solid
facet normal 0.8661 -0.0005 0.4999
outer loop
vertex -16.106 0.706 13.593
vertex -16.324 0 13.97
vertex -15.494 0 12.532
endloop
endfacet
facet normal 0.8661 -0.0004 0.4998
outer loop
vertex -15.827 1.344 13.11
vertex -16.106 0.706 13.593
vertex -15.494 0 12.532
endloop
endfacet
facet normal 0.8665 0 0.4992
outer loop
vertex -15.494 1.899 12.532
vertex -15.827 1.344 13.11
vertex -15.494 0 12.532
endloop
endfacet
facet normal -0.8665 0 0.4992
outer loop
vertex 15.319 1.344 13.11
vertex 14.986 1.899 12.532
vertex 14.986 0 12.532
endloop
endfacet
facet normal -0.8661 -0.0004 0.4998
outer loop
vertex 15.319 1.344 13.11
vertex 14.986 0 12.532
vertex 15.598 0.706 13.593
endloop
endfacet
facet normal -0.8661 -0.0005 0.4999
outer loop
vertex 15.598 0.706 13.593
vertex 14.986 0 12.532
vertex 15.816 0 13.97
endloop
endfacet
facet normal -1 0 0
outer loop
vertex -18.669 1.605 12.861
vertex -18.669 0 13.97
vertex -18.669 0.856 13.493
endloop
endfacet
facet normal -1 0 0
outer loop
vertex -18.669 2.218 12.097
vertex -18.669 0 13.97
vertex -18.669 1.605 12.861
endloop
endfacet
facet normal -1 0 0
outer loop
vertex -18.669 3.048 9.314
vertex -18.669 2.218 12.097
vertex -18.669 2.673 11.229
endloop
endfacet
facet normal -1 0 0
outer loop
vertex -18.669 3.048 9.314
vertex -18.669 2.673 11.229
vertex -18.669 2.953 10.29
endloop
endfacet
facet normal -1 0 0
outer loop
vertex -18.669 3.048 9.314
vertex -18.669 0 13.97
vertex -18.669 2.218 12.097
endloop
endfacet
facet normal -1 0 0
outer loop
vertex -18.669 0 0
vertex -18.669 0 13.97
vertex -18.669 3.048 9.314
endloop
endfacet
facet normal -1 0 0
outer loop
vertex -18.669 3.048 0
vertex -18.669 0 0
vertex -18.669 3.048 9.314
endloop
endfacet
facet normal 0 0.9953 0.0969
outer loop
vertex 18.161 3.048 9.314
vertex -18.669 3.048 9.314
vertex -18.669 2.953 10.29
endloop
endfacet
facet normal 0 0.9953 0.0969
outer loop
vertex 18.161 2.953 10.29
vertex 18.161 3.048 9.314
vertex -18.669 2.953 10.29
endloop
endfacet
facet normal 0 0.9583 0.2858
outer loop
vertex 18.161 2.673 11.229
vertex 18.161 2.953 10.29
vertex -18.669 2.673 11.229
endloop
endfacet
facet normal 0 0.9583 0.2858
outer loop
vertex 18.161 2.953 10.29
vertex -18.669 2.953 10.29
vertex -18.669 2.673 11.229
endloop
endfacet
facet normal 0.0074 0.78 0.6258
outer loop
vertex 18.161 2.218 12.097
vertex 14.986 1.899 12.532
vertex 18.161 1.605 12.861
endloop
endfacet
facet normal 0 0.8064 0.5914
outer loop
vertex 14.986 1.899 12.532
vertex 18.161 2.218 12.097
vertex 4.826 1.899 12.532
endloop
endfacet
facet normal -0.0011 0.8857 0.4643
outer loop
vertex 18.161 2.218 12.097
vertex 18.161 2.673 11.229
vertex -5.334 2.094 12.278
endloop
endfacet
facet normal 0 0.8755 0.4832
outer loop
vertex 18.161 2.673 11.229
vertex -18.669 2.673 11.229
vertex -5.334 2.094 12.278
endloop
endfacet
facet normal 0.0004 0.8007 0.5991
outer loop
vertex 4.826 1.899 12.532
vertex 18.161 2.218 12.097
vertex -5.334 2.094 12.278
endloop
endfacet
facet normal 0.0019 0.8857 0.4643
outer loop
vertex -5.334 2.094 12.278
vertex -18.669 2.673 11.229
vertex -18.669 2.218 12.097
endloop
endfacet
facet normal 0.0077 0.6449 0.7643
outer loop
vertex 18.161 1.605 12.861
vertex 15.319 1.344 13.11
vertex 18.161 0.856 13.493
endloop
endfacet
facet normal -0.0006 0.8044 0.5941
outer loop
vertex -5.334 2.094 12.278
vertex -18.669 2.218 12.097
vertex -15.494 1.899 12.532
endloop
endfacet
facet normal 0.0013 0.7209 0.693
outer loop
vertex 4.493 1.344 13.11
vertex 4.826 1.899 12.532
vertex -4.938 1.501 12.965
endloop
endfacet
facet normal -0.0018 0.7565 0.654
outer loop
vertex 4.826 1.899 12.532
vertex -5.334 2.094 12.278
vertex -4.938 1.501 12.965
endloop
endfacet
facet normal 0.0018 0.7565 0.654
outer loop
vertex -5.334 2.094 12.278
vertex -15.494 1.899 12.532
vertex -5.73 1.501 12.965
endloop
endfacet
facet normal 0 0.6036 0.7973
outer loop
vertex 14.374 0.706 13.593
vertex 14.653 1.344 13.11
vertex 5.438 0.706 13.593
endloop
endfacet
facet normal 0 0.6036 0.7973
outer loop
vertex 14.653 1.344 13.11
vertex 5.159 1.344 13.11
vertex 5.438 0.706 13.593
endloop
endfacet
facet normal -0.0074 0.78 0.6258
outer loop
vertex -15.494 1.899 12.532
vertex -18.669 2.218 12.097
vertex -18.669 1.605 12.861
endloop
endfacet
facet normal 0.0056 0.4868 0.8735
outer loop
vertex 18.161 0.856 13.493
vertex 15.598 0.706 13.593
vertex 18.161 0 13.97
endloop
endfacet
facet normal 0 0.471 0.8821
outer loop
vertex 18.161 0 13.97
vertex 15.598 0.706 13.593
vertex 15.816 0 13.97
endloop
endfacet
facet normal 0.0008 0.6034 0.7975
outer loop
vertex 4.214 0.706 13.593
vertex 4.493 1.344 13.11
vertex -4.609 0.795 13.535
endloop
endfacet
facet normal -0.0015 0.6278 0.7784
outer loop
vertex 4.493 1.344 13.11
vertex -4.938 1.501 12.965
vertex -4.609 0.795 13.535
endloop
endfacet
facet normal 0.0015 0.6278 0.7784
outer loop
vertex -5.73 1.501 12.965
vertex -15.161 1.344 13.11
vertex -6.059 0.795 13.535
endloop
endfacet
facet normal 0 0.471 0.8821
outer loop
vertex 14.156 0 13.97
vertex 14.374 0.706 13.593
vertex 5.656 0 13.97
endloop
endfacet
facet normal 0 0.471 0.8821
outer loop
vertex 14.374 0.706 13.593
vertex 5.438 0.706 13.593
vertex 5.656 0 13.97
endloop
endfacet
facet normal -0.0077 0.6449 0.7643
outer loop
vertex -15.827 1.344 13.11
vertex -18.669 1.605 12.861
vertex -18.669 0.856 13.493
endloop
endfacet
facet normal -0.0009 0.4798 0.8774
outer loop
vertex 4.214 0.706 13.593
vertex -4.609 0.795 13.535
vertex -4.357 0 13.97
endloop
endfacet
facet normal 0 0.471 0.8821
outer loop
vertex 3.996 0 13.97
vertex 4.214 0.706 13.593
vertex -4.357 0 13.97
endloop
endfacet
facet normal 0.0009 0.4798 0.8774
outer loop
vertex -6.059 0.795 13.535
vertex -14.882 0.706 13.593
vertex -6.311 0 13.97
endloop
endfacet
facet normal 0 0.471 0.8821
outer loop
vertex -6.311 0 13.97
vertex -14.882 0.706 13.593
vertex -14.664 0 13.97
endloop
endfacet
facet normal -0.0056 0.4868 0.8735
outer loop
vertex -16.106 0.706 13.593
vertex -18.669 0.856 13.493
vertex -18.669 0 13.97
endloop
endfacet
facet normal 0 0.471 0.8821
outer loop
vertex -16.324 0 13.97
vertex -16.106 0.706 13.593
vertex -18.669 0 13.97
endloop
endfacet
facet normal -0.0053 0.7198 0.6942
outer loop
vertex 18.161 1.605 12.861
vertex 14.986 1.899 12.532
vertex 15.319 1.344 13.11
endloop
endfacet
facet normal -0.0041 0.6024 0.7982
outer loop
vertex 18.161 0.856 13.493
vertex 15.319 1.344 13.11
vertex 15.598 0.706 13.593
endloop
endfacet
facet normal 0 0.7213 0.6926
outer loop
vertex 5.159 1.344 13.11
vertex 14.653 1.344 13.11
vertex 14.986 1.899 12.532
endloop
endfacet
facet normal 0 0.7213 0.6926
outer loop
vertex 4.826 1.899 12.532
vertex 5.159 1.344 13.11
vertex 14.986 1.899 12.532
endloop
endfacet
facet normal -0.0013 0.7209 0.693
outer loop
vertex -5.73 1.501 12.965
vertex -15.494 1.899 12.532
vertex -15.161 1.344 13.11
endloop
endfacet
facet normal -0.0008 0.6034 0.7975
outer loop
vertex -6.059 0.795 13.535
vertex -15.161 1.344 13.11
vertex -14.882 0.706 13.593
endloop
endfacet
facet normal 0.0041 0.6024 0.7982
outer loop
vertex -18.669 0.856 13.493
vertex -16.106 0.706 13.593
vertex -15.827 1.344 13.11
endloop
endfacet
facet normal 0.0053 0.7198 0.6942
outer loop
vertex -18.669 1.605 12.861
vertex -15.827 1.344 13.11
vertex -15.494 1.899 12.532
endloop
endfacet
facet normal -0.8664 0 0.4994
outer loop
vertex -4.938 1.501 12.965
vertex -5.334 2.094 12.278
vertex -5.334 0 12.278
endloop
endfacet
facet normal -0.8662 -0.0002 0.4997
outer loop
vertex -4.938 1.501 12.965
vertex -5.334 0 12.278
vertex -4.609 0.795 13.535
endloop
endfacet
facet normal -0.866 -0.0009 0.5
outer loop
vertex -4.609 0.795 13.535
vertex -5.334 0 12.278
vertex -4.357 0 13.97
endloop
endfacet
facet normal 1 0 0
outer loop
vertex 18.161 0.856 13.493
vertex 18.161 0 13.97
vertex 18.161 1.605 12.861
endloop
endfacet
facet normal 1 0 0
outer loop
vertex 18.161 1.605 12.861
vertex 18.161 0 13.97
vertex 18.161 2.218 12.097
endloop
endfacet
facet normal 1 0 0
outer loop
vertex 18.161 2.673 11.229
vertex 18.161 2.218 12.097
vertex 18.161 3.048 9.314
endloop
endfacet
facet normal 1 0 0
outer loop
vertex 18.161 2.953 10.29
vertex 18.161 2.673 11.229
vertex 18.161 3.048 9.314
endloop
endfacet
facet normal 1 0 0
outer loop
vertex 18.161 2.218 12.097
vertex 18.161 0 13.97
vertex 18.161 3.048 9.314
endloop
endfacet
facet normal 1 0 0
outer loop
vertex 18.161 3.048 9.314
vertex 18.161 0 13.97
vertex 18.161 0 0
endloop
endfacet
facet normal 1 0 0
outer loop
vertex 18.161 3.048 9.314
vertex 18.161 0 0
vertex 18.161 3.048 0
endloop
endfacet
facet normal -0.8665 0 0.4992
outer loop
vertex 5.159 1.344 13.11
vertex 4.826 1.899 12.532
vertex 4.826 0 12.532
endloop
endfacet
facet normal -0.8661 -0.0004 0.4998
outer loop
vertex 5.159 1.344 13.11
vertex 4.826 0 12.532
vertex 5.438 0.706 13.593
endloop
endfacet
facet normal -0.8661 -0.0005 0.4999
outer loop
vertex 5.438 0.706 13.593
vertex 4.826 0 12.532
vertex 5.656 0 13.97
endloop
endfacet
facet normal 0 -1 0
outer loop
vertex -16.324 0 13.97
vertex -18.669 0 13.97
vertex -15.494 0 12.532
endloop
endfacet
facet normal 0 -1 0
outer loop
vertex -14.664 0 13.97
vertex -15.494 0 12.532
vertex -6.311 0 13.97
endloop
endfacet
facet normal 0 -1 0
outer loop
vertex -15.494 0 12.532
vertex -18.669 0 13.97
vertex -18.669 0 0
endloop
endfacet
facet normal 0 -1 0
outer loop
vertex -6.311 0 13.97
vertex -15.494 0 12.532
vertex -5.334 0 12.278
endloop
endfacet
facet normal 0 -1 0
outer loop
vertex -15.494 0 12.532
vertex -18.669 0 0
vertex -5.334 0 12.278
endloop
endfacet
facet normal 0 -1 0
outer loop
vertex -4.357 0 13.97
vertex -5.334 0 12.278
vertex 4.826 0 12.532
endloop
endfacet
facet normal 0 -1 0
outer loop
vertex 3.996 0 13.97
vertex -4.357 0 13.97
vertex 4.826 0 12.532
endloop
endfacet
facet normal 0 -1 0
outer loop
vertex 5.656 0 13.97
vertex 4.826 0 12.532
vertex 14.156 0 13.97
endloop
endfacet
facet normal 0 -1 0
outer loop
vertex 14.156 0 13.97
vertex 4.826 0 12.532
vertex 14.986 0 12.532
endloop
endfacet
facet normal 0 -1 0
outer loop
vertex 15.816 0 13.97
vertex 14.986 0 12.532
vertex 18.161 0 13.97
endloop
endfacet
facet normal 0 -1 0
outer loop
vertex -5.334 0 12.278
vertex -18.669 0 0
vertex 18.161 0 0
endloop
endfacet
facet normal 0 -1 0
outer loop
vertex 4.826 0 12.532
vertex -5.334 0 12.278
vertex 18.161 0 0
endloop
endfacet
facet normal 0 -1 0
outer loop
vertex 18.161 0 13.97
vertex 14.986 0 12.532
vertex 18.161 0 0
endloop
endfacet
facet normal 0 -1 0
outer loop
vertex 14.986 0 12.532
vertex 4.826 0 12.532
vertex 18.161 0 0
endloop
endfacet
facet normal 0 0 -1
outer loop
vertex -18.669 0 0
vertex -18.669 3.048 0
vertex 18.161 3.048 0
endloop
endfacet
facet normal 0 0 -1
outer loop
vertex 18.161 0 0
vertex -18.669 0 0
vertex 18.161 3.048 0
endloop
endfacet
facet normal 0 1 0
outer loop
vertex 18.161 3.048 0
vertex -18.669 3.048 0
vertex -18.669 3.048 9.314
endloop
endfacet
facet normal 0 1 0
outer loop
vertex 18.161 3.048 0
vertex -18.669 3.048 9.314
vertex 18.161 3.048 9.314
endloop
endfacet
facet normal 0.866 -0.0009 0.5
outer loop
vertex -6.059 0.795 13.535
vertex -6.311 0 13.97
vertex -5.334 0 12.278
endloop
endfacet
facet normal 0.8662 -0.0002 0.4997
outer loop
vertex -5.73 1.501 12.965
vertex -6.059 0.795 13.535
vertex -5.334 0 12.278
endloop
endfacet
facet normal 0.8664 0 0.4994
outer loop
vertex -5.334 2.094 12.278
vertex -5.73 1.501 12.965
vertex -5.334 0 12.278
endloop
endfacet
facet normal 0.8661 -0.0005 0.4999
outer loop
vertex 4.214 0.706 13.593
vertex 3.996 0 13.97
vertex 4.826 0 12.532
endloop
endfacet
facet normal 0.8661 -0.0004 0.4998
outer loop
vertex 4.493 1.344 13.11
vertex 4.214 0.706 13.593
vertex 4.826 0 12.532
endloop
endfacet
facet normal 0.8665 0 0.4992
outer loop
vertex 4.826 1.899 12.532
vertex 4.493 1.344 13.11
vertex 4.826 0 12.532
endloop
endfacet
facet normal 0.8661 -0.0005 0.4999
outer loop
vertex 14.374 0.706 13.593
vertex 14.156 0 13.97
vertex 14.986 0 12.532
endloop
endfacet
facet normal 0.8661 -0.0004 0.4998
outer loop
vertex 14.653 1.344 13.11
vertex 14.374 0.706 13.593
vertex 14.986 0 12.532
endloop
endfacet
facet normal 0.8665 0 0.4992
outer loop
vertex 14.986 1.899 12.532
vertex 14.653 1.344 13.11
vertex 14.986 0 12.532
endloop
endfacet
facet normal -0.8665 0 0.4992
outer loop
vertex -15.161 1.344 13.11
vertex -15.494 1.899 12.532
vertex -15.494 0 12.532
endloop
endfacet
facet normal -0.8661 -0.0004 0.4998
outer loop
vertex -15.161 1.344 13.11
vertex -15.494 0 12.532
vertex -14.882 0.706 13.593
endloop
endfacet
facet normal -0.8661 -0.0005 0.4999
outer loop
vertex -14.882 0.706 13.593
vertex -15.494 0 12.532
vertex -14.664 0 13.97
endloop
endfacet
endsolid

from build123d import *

# Parameters (mm, degrees)
F0_W        = 36.83
F0_H        = 3.048
F1_DEPTH    = 13.97
F3_T1_DEPTH = 60.1094845304
F4_DEPTH    = 25.4


# Not quite as in the source:
# - a fillet or chamfer that OpenCascade refuses, or shapes differently, is made with other operations: its cross-section is extruded or revolved along the edge and cut away or added


with BuildPart() as f1:
    # F0 (on Top) → F1 (new body)
    with BuildSketch(Plane.XY):
        with Locations((-0.254, 1.524)):
            Rectangle(F0_W, F0_H)
    extrude(amount=F1_DEPTH)

    # F3: fillet of radius 5.08 on 1 edges, made by hand

    # F3_s2 → F3_t1 (cut)
    with BuildSketch(Plane.YZ.offset(-30.3087422652)):
        with BuildLine():
            ThreePointArc((3.048, 9.3141030939), (2.2182329348, 12.0965336861), (0, 13.97))
            Line((0, 13.97), (3.048, 13.97))
            Line((3.048, 13.97), (3.048, 9.3141030939))
        make_face()
    extrude(amount=F3_T1_DEPTH, mode=Mode.SUBTRACT)

    # F2 (on face) → F4 (cut)
    with BuildSketch(Plane.XZ):
        Polygon((-15.494, 12.5322954744), (-14.6639409051, 13.97), (-16.3240590949, 13.97), align=None)
        Polygon((-4.3572939367, 13.97), (-6.3107060633, 13.97), (-5.334, 12.2782954744), align=None)
        Polygon((5.6560590949, 13.97), (3.9959409051, 13.97), (4.826, 12.5322954744), align=None)
        Polygon((15.8160590949, 13.97), (14.1559409051, 13.97), (14.986, 12.5322954744), align=None)
    extrude(amount=-F4_DEPTH, mode=Mode.SUBTRACT)


solid = f1.part
